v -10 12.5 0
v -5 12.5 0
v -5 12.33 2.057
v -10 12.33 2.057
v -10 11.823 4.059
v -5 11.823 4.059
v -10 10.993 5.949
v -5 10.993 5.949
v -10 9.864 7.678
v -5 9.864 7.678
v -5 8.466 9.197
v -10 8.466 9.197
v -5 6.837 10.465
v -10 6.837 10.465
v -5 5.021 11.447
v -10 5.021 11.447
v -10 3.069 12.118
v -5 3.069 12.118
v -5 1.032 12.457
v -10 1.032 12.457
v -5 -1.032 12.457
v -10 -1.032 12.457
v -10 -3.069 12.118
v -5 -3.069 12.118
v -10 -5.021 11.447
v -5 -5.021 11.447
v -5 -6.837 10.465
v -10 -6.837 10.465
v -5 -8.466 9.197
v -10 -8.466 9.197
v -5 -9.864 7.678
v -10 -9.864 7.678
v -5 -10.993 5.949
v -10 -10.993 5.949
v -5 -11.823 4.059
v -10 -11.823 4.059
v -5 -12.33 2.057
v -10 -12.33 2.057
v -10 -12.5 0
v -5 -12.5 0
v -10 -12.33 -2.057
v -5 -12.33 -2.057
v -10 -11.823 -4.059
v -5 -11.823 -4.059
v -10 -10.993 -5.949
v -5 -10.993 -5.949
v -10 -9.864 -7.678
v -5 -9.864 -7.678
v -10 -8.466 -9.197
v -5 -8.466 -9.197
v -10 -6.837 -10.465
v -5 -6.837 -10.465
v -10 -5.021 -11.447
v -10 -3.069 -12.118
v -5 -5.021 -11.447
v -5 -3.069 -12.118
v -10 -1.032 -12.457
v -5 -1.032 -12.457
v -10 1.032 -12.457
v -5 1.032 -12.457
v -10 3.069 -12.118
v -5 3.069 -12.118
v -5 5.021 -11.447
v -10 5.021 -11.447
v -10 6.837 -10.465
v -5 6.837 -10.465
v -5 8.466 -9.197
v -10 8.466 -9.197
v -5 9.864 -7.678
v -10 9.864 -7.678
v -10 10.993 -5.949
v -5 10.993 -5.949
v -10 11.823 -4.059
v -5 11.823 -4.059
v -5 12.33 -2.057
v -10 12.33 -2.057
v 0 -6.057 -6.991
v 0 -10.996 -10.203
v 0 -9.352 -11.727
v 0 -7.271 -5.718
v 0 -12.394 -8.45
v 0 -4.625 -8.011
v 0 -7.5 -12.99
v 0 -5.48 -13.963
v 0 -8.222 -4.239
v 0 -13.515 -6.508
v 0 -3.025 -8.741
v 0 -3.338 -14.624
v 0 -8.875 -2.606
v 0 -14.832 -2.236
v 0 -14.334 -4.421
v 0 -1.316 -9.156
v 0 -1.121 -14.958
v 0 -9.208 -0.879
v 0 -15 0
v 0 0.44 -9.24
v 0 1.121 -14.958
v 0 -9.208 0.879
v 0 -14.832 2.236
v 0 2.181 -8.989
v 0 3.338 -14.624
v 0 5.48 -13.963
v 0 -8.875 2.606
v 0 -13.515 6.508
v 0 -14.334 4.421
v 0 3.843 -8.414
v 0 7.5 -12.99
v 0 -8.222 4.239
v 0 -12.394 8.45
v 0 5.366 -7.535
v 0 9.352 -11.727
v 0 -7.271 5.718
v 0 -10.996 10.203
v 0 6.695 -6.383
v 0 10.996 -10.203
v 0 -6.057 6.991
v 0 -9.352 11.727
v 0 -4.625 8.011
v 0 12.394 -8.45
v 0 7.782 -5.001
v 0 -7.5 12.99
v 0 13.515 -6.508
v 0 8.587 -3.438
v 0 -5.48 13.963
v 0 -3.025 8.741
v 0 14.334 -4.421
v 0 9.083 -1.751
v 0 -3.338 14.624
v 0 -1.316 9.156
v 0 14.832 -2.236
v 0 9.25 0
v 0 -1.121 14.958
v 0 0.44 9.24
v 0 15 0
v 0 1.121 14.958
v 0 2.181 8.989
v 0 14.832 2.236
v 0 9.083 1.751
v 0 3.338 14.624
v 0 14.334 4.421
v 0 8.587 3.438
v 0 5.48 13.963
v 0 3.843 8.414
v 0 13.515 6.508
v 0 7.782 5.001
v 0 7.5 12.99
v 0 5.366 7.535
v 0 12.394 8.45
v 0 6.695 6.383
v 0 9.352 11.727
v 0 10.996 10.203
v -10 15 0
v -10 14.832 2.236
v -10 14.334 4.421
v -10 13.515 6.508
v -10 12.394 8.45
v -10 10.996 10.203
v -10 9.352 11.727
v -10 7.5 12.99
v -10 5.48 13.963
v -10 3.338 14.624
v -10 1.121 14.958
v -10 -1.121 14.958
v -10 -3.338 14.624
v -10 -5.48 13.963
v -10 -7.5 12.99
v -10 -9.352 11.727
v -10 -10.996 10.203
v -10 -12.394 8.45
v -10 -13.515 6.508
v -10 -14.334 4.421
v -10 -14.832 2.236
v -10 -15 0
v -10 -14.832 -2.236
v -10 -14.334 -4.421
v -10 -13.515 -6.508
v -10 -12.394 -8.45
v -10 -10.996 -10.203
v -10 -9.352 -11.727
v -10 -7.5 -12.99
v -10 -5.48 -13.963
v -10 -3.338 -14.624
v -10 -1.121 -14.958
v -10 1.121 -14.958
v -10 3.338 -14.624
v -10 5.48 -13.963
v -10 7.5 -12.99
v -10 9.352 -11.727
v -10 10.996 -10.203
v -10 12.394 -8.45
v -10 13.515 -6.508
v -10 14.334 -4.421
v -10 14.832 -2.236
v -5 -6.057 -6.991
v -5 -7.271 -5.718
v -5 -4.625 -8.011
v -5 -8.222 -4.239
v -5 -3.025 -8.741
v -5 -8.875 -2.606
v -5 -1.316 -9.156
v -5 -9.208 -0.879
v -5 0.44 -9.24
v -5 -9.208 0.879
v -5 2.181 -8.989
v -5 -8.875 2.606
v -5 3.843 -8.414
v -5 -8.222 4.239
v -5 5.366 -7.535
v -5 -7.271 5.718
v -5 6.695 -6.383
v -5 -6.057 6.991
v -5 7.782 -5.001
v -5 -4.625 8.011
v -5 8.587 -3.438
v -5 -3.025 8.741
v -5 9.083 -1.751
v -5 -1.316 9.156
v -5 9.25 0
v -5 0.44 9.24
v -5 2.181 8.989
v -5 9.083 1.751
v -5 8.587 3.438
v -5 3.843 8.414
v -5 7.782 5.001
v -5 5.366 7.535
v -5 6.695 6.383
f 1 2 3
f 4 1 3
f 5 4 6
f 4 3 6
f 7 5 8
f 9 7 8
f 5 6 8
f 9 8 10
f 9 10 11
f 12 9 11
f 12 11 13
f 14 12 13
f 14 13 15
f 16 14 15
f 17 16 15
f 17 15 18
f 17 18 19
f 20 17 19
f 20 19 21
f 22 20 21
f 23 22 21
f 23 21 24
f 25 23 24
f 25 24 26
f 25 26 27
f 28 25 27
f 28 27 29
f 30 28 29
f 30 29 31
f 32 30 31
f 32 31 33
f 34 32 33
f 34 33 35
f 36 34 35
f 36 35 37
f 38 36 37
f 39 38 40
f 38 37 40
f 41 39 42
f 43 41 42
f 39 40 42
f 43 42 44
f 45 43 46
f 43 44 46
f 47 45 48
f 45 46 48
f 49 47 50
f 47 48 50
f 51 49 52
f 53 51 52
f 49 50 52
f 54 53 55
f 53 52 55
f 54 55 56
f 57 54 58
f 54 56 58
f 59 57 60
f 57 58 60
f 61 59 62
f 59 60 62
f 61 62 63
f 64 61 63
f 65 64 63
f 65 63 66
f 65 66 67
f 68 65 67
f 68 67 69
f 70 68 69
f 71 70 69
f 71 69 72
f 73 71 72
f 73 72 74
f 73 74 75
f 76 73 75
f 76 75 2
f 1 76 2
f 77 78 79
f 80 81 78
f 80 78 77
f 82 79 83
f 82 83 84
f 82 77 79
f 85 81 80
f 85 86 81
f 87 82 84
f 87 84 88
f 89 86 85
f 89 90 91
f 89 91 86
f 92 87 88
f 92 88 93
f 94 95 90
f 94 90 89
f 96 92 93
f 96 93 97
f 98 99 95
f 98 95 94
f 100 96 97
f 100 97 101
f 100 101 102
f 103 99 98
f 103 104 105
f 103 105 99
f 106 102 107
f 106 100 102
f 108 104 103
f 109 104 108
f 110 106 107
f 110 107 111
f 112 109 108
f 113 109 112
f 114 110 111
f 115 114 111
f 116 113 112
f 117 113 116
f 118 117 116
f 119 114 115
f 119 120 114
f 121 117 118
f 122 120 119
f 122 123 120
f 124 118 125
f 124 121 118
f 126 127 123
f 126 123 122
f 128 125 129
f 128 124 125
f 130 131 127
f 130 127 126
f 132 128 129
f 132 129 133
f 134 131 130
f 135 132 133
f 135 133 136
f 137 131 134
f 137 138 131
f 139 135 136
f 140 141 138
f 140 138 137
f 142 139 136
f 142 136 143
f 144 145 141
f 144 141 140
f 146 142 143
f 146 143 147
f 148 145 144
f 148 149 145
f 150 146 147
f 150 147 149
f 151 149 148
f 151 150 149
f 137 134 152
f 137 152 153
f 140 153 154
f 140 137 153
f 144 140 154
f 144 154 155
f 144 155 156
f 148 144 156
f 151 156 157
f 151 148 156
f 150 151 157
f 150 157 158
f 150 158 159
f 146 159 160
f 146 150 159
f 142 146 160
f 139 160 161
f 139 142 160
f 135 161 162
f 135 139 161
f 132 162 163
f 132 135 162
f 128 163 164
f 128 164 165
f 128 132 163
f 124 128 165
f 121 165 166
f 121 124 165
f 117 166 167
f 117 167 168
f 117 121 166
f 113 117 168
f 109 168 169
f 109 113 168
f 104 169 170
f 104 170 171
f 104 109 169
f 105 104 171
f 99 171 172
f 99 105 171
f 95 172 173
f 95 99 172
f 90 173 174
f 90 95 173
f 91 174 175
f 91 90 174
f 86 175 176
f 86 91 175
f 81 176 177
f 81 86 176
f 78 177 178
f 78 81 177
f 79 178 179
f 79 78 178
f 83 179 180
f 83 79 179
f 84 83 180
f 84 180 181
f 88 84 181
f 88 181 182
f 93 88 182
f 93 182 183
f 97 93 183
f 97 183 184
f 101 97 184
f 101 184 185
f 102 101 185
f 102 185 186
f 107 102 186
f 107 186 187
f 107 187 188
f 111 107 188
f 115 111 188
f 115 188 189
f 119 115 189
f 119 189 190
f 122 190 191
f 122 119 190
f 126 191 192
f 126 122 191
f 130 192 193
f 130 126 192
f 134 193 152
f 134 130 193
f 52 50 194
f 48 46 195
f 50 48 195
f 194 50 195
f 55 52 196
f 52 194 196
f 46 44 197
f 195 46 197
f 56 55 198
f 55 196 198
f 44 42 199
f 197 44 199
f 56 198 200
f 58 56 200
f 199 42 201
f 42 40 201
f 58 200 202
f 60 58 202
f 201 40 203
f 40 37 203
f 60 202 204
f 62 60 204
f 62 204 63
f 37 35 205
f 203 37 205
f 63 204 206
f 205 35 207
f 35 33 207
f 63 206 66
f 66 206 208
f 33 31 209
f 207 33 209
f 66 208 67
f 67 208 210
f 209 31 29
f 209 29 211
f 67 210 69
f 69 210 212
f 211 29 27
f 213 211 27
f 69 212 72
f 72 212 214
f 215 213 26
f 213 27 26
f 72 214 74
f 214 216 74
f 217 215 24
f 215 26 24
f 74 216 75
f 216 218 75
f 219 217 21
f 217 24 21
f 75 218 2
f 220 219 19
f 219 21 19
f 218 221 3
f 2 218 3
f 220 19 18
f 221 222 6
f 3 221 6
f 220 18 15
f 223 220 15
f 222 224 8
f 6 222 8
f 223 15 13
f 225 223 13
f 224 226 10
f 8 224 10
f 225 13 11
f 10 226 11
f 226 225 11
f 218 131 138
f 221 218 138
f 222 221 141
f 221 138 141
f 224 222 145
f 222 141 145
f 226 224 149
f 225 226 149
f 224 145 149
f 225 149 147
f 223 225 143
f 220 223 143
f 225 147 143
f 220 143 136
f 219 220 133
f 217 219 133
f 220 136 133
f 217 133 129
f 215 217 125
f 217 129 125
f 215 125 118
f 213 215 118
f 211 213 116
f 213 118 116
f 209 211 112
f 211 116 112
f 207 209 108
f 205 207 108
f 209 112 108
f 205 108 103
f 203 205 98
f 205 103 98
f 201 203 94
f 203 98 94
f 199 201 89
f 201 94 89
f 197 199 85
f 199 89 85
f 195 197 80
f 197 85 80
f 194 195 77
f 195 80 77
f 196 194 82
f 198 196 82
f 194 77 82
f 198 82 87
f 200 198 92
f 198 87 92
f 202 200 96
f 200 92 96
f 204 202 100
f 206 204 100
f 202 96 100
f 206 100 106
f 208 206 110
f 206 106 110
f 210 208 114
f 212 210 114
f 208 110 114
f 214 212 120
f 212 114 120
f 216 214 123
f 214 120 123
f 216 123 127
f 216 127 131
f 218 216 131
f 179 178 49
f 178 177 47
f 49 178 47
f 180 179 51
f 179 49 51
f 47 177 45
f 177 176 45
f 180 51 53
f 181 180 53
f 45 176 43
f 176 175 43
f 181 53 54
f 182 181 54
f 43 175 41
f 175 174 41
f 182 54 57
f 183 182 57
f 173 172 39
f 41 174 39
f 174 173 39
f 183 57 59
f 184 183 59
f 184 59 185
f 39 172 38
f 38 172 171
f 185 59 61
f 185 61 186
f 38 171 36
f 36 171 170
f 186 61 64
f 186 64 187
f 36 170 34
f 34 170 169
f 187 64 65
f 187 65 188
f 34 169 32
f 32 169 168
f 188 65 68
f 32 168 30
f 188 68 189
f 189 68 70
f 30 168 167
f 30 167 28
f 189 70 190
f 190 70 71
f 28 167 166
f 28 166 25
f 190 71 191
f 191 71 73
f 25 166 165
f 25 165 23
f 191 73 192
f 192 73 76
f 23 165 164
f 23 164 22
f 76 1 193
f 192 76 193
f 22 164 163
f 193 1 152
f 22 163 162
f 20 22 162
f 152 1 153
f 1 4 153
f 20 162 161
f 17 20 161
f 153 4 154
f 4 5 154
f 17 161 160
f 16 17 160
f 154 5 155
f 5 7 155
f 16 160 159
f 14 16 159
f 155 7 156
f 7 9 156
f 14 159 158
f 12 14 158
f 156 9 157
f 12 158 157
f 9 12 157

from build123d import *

# Parameters (mm, degrees)
F1_R     = 15
F2_DEPTH = 10
F0_R     = 9.25
F3_DEPTH = 5
F4_R     = 12.5
F5_DEPTH = 25


with BuildPart() as f2:
    # F1 (on Right) → F2 (new body)
    with BuildSketch(Plane.YZ):
        Circle(F1_R)
    extrude(amount=-F2_DEPTH)

    # F0 (on Right) → F3 (cut)
    with BuildSketch(Plane.YZ):
        Circle(F0_R)
    extrude(amount=-F3_DEPTH, mode=Mode.SUBTRACT)

    # F4 (on face) → F5 (cut)
    with BuildSketch(Plane.YZ.offset(-5)):
        Circle(F4_R)
    extrude(amount=-F5_DEPTH, mode=Mode.SUBTRACT)


solid = f2.part
